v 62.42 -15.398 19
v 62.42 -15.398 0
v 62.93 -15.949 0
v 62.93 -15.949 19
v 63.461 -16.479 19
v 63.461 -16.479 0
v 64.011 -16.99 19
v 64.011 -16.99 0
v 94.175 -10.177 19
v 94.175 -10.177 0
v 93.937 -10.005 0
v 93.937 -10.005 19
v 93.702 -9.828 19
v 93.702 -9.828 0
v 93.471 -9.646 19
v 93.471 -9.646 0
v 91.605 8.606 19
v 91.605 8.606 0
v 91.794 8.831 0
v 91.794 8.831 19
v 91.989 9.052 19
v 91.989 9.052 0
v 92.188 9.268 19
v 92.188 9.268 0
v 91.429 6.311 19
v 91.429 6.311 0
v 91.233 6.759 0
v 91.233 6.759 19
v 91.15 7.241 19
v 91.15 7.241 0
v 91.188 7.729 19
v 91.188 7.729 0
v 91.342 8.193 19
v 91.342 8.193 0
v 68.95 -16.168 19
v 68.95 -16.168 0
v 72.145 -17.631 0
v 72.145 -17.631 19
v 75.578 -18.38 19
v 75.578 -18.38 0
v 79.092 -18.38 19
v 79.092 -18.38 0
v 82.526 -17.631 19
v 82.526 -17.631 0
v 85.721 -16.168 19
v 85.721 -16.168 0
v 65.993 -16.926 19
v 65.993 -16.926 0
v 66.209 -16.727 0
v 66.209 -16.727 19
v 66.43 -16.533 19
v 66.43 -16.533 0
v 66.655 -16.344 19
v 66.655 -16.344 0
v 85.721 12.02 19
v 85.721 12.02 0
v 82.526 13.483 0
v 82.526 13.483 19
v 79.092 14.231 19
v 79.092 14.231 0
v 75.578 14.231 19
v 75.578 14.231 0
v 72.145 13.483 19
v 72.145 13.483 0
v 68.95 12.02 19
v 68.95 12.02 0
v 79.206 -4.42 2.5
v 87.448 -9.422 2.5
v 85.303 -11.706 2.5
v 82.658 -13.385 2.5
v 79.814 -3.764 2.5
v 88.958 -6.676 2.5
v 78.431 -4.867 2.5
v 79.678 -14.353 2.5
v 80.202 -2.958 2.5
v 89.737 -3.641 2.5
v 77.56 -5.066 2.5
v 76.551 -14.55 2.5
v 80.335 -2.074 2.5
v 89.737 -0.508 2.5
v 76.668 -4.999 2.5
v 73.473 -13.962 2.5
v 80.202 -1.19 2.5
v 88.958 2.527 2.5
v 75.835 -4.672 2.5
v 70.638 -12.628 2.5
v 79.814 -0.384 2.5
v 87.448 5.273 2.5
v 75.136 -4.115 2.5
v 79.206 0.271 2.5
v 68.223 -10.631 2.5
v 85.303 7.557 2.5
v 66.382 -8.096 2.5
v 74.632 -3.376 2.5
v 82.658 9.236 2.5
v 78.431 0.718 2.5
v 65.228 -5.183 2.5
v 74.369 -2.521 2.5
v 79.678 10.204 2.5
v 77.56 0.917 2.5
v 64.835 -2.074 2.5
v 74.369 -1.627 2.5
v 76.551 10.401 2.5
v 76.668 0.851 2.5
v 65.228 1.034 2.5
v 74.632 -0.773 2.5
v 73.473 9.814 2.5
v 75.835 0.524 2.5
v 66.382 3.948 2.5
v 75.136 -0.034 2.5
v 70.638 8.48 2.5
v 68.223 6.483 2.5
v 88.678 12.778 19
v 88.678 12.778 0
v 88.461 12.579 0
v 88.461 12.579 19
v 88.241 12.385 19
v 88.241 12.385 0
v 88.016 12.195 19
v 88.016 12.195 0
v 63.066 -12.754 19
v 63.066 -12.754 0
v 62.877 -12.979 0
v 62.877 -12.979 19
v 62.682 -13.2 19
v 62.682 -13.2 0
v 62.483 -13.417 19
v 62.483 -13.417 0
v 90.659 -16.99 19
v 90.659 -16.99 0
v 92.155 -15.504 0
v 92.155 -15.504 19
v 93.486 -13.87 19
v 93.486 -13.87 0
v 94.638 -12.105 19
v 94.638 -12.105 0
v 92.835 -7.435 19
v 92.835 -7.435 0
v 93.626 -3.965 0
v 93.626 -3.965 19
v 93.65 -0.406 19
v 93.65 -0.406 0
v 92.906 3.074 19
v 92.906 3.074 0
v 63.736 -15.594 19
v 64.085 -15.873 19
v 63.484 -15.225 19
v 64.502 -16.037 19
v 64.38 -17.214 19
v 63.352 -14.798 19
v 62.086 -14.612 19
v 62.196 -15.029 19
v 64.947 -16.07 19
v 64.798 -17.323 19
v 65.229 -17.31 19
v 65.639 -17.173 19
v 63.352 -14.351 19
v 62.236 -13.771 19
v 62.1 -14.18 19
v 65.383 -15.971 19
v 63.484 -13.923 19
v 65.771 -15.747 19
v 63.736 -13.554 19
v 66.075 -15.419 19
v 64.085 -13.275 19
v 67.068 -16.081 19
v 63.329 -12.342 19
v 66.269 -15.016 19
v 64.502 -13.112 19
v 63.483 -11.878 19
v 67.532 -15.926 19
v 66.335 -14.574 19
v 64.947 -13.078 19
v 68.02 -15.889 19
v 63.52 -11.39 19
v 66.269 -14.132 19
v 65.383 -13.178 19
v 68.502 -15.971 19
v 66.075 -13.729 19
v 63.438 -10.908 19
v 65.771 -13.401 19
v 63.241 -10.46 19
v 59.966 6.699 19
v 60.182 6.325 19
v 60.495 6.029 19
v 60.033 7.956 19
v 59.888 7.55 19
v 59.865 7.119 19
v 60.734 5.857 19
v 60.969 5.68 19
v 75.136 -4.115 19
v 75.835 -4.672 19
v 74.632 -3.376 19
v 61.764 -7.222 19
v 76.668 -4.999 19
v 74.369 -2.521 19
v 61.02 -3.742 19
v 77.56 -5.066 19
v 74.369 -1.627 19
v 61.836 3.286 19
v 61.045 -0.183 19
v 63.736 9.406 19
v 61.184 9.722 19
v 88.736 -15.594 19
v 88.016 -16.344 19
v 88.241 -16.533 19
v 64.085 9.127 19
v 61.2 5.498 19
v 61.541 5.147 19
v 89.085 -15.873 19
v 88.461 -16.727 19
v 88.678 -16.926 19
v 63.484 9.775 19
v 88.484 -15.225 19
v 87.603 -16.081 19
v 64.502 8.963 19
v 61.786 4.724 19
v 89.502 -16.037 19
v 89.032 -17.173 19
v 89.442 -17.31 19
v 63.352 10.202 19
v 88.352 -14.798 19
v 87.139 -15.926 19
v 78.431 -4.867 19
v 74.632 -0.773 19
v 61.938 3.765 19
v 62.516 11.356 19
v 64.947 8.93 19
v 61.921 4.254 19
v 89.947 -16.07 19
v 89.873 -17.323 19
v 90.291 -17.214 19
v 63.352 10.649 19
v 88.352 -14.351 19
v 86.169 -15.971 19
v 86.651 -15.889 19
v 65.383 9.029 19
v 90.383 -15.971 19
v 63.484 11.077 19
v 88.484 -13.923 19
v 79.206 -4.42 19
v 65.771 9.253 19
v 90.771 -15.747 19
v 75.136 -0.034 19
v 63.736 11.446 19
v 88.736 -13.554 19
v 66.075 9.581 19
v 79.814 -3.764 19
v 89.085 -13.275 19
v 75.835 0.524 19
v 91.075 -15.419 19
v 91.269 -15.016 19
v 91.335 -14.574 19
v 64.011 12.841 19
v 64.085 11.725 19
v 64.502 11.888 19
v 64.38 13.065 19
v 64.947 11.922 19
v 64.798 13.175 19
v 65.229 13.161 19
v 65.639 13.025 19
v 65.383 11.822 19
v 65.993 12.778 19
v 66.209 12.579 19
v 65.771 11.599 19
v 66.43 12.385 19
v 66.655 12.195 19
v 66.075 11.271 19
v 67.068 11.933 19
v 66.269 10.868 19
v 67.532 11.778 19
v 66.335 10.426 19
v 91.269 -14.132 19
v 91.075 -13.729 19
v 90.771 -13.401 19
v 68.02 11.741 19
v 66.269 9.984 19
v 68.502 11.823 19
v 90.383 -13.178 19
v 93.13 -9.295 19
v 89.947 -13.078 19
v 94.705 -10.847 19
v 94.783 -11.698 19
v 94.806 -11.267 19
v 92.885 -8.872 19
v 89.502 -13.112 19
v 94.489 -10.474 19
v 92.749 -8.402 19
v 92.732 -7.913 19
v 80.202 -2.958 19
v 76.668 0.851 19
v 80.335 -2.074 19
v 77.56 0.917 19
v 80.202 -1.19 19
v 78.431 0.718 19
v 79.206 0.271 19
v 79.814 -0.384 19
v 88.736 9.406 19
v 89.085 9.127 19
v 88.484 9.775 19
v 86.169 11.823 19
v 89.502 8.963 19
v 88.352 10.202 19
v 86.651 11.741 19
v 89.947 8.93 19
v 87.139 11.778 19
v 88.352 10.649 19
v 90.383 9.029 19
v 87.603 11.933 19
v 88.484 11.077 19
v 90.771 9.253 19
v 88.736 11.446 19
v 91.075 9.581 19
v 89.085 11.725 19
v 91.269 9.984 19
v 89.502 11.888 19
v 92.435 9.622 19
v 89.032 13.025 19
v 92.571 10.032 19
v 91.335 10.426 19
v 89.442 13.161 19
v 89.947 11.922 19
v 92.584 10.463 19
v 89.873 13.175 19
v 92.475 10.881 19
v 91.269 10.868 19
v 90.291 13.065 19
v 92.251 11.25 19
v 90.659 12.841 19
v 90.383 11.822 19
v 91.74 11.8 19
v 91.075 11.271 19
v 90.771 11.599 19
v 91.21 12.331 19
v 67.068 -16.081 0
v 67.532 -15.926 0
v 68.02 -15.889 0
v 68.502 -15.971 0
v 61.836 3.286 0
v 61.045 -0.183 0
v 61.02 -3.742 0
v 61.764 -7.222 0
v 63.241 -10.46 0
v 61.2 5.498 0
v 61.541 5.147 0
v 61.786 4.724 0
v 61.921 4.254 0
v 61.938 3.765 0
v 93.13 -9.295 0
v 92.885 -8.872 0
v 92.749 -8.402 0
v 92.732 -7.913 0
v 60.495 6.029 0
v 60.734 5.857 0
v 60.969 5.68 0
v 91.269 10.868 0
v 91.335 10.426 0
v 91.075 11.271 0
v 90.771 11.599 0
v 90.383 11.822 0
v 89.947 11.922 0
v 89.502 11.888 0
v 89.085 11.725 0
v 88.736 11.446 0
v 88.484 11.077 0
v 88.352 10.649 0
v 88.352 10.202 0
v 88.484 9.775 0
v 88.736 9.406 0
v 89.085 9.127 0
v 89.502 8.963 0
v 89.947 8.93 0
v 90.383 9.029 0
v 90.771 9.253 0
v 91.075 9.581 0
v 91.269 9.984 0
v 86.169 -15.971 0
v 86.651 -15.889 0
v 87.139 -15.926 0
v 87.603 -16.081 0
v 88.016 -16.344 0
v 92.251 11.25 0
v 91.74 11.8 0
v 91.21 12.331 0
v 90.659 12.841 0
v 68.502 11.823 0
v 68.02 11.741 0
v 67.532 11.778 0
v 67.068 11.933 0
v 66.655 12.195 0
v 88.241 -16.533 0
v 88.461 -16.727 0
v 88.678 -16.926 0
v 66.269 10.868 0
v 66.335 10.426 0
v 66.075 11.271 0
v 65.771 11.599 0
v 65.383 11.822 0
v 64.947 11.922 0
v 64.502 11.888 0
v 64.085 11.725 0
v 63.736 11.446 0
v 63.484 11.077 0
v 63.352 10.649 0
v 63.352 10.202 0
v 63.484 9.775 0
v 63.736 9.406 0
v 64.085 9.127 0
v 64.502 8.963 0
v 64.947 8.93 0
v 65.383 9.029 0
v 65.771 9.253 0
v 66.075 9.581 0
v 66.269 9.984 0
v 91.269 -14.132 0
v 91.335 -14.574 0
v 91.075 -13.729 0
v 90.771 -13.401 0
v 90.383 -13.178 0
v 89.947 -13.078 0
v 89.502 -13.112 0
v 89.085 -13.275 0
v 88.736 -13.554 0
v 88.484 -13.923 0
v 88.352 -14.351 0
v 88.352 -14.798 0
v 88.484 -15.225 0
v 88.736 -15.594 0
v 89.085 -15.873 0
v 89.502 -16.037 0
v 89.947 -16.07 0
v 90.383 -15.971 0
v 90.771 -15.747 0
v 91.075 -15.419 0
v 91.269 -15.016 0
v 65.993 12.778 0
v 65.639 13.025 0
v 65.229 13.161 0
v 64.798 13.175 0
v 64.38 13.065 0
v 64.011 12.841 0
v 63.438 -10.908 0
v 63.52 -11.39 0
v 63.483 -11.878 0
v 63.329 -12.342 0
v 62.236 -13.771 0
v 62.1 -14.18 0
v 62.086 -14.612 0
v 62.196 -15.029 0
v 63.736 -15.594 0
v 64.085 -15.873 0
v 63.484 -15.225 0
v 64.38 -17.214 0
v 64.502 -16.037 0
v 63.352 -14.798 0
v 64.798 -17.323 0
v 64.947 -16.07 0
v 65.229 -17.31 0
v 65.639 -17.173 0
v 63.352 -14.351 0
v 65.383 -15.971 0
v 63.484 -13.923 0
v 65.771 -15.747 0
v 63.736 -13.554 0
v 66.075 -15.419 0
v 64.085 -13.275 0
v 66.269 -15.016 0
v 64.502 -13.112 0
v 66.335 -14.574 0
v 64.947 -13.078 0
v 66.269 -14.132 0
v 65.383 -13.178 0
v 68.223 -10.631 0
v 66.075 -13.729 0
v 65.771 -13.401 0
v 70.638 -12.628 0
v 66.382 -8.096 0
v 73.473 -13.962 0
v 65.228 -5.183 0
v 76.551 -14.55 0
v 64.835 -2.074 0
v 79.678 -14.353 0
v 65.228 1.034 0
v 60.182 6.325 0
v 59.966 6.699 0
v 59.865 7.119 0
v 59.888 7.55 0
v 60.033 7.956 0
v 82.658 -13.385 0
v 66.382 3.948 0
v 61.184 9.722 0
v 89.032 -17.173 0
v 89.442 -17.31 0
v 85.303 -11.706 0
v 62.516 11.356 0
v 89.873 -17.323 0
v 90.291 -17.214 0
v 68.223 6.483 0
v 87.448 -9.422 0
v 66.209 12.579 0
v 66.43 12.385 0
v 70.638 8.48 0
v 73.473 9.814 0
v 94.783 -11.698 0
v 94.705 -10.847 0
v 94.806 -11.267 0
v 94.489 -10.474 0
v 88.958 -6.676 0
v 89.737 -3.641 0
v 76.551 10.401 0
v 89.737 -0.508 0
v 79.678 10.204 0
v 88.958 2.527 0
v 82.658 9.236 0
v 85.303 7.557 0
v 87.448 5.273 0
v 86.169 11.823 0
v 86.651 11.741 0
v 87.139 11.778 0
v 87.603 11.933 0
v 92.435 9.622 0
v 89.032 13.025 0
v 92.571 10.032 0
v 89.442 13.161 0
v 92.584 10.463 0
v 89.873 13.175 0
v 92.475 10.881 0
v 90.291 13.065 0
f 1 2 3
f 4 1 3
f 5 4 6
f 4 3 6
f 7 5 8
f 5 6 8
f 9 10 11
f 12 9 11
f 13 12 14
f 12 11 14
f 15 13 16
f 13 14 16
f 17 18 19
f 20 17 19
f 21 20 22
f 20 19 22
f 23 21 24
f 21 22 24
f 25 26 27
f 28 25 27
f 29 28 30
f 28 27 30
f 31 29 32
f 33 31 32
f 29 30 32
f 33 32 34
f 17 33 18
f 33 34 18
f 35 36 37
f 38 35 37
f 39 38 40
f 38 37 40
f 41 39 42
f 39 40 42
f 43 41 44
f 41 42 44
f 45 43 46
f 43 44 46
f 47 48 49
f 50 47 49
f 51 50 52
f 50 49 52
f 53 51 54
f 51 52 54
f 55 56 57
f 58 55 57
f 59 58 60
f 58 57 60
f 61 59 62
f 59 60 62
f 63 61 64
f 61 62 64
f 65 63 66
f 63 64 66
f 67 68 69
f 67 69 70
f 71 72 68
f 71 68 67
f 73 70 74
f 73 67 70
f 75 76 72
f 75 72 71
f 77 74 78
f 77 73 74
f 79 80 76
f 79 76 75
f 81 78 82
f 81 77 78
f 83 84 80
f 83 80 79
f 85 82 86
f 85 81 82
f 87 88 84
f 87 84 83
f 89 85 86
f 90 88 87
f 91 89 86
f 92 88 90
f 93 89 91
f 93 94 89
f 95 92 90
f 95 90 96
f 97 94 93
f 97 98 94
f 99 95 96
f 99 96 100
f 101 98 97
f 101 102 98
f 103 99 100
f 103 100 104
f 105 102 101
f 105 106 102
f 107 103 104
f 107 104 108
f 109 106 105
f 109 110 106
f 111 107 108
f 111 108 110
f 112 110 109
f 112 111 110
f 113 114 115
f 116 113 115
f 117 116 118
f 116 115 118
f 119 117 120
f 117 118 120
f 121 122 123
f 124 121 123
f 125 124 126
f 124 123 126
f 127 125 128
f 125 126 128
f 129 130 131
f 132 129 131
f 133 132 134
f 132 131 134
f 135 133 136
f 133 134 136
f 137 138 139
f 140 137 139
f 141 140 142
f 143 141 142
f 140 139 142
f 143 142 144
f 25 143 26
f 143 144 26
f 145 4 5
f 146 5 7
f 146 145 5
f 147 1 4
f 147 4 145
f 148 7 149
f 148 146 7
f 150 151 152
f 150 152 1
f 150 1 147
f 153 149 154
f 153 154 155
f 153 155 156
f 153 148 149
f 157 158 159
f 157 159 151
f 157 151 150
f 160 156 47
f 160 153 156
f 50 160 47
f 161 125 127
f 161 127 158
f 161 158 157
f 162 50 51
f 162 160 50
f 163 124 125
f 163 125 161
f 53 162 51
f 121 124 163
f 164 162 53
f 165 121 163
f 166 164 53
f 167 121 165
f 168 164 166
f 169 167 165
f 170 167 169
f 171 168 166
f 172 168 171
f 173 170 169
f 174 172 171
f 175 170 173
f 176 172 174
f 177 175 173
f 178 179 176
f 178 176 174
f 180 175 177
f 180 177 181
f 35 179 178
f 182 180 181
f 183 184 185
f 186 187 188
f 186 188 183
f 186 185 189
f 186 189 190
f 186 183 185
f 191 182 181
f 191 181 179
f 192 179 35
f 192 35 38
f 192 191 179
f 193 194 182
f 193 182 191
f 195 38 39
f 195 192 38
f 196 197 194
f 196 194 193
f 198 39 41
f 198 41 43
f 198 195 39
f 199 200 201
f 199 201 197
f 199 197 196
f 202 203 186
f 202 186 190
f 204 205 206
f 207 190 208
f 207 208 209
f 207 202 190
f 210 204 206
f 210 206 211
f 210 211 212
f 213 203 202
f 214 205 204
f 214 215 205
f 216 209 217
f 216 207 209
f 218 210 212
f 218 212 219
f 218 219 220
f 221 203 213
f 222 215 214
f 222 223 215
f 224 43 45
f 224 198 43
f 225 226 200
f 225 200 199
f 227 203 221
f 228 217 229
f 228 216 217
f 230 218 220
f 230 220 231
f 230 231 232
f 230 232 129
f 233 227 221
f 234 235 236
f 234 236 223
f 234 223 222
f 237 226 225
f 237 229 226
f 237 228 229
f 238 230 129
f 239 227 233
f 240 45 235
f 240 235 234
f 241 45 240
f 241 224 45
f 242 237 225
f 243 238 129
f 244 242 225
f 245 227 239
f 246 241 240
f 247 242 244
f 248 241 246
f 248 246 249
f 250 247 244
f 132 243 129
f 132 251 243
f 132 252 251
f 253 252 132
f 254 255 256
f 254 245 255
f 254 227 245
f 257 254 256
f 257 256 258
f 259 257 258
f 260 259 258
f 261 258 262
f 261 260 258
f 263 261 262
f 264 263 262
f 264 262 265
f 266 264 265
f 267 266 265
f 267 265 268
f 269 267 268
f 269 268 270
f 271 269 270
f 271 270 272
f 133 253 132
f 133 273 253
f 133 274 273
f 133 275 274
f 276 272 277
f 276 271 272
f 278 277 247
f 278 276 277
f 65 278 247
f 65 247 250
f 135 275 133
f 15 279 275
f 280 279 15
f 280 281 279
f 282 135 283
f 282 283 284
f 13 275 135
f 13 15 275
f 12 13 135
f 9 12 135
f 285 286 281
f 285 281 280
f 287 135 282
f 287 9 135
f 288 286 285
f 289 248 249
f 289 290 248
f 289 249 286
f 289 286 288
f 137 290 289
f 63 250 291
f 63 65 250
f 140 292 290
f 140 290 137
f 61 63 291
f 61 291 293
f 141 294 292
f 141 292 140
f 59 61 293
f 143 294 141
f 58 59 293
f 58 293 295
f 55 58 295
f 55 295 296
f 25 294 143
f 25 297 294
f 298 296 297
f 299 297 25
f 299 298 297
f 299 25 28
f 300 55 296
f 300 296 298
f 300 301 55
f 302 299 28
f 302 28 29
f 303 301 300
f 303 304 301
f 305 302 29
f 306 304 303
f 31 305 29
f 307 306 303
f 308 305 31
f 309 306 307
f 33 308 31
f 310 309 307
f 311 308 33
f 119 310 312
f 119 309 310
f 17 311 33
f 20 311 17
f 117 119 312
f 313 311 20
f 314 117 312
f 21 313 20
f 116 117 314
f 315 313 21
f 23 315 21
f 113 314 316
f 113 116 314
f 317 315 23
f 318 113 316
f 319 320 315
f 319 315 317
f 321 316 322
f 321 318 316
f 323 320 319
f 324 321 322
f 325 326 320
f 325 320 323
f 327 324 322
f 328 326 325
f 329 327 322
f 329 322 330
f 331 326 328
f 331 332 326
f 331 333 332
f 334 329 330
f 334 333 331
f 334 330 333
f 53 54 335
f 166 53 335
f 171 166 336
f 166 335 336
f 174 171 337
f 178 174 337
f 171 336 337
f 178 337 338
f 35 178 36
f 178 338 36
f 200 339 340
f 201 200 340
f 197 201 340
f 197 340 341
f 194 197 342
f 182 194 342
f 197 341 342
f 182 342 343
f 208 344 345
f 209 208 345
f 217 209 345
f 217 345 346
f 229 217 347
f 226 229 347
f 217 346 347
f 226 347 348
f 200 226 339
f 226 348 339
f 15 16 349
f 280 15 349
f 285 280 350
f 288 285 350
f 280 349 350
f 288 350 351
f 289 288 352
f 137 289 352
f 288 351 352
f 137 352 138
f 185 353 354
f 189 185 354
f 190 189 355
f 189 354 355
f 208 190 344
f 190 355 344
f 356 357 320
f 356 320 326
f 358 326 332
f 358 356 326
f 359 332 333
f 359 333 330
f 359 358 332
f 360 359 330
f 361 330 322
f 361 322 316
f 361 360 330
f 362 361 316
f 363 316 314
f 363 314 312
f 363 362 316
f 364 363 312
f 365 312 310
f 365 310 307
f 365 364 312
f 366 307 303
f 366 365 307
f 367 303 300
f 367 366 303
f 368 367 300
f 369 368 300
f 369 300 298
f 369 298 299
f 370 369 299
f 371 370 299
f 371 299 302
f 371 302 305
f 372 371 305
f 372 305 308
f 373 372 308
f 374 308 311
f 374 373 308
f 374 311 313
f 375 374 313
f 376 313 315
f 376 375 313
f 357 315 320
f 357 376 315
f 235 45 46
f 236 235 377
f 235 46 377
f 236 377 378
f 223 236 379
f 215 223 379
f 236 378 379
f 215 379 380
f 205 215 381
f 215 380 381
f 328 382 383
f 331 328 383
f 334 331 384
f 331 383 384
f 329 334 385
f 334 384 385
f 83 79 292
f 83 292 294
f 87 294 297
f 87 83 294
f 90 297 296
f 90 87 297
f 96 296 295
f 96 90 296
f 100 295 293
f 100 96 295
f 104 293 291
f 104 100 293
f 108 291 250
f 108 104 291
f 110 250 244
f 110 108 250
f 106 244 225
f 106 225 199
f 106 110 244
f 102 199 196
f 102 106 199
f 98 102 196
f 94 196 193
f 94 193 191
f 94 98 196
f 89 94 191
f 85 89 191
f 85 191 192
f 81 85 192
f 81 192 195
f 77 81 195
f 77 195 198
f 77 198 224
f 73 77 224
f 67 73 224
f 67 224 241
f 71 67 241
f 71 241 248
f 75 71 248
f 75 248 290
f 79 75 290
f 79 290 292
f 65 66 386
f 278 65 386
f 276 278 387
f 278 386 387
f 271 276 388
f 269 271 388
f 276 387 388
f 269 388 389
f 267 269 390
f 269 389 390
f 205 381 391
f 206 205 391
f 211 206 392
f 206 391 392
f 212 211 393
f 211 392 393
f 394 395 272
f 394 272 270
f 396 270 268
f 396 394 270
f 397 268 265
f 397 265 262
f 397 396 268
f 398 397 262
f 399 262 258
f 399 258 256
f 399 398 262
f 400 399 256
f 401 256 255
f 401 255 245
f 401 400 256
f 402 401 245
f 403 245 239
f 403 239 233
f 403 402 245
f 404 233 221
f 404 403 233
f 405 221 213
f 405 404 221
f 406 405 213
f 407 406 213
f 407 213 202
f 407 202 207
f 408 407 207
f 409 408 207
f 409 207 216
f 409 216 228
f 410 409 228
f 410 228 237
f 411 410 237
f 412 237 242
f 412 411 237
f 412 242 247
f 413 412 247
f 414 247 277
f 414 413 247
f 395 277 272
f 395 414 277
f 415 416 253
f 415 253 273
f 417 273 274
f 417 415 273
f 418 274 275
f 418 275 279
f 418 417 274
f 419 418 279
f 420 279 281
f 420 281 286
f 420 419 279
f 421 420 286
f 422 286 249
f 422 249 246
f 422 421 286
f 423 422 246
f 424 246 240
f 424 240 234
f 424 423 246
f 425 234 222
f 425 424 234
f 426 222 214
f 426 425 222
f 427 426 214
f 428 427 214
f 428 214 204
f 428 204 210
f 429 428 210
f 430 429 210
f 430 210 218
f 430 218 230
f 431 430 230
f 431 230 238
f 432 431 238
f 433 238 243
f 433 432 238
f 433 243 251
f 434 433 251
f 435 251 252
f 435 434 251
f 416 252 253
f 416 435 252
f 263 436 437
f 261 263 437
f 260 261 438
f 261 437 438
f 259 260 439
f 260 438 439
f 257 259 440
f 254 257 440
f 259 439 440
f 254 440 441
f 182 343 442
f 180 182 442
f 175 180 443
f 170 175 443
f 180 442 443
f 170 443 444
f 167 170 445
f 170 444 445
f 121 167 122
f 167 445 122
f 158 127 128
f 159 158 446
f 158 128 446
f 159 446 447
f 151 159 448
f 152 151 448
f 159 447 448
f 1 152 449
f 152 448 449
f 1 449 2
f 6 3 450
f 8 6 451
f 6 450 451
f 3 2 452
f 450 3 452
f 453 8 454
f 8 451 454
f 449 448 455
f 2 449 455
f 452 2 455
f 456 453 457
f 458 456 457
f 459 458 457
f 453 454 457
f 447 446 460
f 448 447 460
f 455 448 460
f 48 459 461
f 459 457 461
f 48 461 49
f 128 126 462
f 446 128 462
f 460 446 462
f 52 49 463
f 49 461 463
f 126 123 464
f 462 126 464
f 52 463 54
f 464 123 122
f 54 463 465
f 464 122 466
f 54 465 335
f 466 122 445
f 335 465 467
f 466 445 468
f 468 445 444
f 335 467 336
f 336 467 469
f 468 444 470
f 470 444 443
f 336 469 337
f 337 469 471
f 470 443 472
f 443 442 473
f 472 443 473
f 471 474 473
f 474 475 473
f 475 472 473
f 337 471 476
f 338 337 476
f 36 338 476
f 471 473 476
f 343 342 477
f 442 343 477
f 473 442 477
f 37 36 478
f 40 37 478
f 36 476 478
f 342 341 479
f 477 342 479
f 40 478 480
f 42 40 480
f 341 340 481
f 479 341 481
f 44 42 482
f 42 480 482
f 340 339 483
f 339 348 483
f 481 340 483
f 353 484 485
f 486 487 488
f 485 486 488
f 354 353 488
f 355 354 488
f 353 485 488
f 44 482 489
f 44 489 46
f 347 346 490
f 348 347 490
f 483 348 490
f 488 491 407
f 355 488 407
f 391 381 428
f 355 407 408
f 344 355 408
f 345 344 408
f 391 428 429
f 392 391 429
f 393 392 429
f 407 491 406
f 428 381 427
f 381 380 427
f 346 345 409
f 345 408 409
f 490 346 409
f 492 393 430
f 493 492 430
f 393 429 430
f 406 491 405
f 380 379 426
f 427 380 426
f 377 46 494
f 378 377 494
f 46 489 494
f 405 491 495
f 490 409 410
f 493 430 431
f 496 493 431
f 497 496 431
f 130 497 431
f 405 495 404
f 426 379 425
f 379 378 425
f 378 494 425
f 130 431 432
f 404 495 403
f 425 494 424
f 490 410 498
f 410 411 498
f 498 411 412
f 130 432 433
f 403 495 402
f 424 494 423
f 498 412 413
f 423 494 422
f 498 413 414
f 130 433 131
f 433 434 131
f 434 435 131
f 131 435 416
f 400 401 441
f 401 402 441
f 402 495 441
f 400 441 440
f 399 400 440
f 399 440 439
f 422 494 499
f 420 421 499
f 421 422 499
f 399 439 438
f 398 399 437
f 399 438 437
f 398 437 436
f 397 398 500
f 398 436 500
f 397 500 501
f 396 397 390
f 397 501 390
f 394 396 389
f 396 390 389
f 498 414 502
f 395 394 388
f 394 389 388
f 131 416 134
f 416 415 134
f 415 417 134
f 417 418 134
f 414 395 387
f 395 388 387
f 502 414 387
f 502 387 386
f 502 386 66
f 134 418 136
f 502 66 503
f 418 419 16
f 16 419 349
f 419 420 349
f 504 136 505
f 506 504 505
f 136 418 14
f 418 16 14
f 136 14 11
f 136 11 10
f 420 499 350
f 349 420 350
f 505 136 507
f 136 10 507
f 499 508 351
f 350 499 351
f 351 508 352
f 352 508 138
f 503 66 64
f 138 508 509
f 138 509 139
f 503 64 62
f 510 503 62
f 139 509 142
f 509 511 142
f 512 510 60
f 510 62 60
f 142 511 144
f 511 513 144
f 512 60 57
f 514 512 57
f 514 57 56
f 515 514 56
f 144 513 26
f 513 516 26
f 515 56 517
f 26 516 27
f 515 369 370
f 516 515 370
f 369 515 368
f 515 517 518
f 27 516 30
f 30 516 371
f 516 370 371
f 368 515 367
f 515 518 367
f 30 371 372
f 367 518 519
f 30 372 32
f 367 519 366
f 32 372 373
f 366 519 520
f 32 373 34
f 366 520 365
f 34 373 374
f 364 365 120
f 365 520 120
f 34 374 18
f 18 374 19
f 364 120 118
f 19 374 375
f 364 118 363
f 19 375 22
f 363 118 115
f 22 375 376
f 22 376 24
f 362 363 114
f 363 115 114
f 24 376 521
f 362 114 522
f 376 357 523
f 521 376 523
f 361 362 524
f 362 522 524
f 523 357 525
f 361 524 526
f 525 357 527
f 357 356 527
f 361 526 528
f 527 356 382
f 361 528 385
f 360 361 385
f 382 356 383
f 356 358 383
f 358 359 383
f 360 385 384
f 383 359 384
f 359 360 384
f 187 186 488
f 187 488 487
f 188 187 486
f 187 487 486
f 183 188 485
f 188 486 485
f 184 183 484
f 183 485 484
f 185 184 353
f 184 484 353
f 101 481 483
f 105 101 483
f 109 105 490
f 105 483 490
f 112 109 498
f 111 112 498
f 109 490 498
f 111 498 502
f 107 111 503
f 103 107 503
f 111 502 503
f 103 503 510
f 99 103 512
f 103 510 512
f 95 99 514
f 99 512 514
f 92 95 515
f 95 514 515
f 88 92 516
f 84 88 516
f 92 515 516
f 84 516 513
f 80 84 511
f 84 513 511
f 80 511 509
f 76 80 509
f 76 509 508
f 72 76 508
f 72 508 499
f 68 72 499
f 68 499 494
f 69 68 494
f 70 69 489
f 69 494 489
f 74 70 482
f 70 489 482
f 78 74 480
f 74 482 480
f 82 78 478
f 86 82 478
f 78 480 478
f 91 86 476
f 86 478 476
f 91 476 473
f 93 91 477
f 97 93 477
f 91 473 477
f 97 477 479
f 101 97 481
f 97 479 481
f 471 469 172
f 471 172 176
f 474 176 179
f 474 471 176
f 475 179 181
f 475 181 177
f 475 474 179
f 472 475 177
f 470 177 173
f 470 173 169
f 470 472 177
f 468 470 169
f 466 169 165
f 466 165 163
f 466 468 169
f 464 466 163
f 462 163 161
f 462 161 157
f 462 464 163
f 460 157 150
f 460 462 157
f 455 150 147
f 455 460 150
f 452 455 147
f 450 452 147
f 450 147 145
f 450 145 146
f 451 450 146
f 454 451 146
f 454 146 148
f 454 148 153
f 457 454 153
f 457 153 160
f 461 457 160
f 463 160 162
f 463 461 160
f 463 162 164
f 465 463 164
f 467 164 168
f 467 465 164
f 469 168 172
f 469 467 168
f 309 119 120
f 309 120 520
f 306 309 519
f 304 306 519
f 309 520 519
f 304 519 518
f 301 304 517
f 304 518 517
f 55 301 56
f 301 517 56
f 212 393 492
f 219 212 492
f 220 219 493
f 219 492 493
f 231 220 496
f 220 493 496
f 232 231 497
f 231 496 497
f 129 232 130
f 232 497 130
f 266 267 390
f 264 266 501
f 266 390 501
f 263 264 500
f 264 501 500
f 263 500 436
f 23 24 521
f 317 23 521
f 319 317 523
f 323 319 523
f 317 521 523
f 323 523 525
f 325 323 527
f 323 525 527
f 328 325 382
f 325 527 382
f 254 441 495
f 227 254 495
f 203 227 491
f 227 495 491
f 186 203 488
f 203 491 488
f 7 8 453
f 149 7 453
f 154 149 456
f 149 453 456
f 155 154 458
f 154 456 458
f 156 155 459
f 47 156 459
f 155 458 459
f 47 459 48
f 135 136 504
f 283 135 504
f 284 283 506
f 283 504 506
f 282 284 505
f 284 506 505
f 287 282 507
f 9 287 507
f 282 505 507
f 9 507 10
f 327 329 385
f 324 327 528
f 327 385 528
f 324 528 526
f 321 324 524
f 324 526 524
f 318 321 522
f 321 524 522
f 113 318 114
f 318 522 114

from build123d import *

# Parameters (mm, degrees)
SKETCH1_R               = 3
SKETCH1_R_2             = 1.5
SALIENTE_EXTRUIR1_DEPTH = 19
CROQUIS1_R              = 12.5
CORTAR_EXTRUIR1_DEPTH   = 2.5


with BuildPart() as part:
    # Sketch1 → Saliente-Extruir1 (new body)
    with BuildSketch(Plane.XY):
        with BuildLine():
            ThreePointArc((61.836197312, 3.286280309), (61.020411334, -3.741981398), (63.24135958, -10.459820208))
            ThreePointArc((63.24135958, -10.459820208), (63.516762306, -11.634828053), (63.06603659, -12.754353143))
            ThreePointArc((63.06603659, -12.754353143), (62.779959062, -13.090315668), (62.483190577, -13.416872916))
            ThreePointArc((62.483190577, -13.416872916), (62.077613071, -14.395673215), (62.420017601, -15.398320849))
            ThreePointArc((62.420017601, -15.398320849), (63.193255854, -16.216357175), (64.01129218, -16.989595428))
            ThreePointArc((64.01129218, -16.989595428), (65.013939814, -17.331999958), (65.992740113, -16.926422452))
            ThreePointArc((65.992740113, -16.926422452), (66.319297361, -16.629653967), (66.655259886, -16.343576439))
            ThreePointArc((66.655259886, -16.343576439), (67.774784976, -15.892850723), (68.949792821, -16.168253449))
            ThreePointArc((68.949792821, -16.168253449), (77.335391478, -18.474221551), (85.720990136, -16.168253449))
            ThreePointArc((85.720990136, -16.168253449), (86.89599798, -15.892850723), (88.01552307, -16.343576439))
            ThreePointArc((88.01552307, -16.343576439), (88.351485595, -16.629653967), (88.678042843, -16.926422452))
            ThreePointArc((88.678042843, -16.926422452), (89.656843143, -17.331999958), (90.659490776, -16.989595428))
            ThreePointArc((90.659490776, -16.989595428), (92.842363907, -14.704890816), (94.638151595, -12.104899113))
            ThreePointArc((94.638151595, -12.104899113), (94.770607573, -11.053709999), (94.175376931, -10.17721492))
            ThreePointArc((94.175376931, -10.17721492), (93.818673805, -9.917457245), (93.470537538, -9.646325709))
            ThreePointArc((93.470537538, -9.646325709), (92.802619494, -8.641151304), (92.834585645, -7.434723411))
            ThreePointArc((92.834585645, -7.434723411), (93.650371622, -0.406461703), (91.429423377, 6.311377107))
            ThreePointArc((91.429423377, 6.311377107), (91.154020651, 7.486384951), (91.604746367, 8.605910041))
            ThreePointArc((91.604746367, 8.605910041), (91.890823894, 8.941872566), (92.187592379, 9.268429814))
            ThreePointArc((92.187592379, 9.268429814), (92.593169886, 10.247230114), (92.250765355, 11.249877747))
            ThreePointArc((92.250765355, 11.249877747), (91.477527102, 12.067914073), (90.659490776, 12.841152326))
            ThreePointArc((90.659490776, 12.841152326), (89.656843142, 13.183556857), (88.678042843, 12.77797935))
            ThreePointArc((88.678042843, 12.77797935), (88.351485595, 12.481210865), (88.01552307, 12.195133338))
            ThreePointArc((88.01552307, 12.195133338), (86.89599798, 11.744407622), (85.720990135, 12.019810348))
            ThreePointArc((85.720990135, 12.019810348), (77.335391478, 14.325778449), (68.949792821, 12.019810348))
            ThreePointArc((68.949792821, 12.019810348), (67.774784976, 11.744407622), (66.655259886, 12.195133338))
            ThreePointArc((66.655259886, 12.195133338), (66.319297361, 12.481210865), (65.992740113, 12.77797935))
            ThreePointArc((65.992740113, 12.77797935), (65.013939814, 13.183556857), (64.01129218, 12.841152326))
            ThreePointArc((64.01129218, 12.841152326), (61.828419049, 10.556447714), (60.032631362, 7.956456011))
            ThreePointArc((60.032631362, 7.956456011), (59.900175383, 6.905266897), (60.495406025, 6.028771818))
            ThreePointArc((60.495406025, 6.028771818), (60.852109152, 5.769014143), (61.200245419, 5.497882608))
            ThreePointArc((61.200245419, 5.497882608), (61.868163462, 4.492708203), (61.836197312, 3.286280309))
        make_face()
        with Locations((77.335391478, -2.074221551)):
            Circle(SKETCH1_R, mode=Mode.SUBTRACT)
        with Locations((89.83539148, 10.425778451)):
            Circle(SKETCH1_R_2, mode=Mode.SUBTRACT)
        with Locations((64.835391477, 10.425778451)):
            Circle(SKETCH1_R_2, mode=Mode.SUBTRACT)
        with Locations((89.83539148, -14.574221552)):
            Circle(SKETCH1_R_2, mode=Mode.SUBTRACT)
        with Locations((64.835391477, -14.574221552)):
            Circle(SKETCH1_R_2, mode=Mode.SUBTRACT)
    extrude(amount=SALIENTE_EXTRUIR1_DEPTH)

    # Croquis1 → Cortar-Extruir1 (cut)
    with BuildSketch(Plane(origin=(0, 0, 0), x_dir=(-1, 0, 0), z_dir=(0, 0, -1))):
        with Locations((-77.335391478, -2.074221551)):
            Circle(CROQUIS1_R)
    extrude(amount=-CORTAR_EXTRUIR1_DEPTH, mode=Mode.SUBTRACT)


solid = part.part
